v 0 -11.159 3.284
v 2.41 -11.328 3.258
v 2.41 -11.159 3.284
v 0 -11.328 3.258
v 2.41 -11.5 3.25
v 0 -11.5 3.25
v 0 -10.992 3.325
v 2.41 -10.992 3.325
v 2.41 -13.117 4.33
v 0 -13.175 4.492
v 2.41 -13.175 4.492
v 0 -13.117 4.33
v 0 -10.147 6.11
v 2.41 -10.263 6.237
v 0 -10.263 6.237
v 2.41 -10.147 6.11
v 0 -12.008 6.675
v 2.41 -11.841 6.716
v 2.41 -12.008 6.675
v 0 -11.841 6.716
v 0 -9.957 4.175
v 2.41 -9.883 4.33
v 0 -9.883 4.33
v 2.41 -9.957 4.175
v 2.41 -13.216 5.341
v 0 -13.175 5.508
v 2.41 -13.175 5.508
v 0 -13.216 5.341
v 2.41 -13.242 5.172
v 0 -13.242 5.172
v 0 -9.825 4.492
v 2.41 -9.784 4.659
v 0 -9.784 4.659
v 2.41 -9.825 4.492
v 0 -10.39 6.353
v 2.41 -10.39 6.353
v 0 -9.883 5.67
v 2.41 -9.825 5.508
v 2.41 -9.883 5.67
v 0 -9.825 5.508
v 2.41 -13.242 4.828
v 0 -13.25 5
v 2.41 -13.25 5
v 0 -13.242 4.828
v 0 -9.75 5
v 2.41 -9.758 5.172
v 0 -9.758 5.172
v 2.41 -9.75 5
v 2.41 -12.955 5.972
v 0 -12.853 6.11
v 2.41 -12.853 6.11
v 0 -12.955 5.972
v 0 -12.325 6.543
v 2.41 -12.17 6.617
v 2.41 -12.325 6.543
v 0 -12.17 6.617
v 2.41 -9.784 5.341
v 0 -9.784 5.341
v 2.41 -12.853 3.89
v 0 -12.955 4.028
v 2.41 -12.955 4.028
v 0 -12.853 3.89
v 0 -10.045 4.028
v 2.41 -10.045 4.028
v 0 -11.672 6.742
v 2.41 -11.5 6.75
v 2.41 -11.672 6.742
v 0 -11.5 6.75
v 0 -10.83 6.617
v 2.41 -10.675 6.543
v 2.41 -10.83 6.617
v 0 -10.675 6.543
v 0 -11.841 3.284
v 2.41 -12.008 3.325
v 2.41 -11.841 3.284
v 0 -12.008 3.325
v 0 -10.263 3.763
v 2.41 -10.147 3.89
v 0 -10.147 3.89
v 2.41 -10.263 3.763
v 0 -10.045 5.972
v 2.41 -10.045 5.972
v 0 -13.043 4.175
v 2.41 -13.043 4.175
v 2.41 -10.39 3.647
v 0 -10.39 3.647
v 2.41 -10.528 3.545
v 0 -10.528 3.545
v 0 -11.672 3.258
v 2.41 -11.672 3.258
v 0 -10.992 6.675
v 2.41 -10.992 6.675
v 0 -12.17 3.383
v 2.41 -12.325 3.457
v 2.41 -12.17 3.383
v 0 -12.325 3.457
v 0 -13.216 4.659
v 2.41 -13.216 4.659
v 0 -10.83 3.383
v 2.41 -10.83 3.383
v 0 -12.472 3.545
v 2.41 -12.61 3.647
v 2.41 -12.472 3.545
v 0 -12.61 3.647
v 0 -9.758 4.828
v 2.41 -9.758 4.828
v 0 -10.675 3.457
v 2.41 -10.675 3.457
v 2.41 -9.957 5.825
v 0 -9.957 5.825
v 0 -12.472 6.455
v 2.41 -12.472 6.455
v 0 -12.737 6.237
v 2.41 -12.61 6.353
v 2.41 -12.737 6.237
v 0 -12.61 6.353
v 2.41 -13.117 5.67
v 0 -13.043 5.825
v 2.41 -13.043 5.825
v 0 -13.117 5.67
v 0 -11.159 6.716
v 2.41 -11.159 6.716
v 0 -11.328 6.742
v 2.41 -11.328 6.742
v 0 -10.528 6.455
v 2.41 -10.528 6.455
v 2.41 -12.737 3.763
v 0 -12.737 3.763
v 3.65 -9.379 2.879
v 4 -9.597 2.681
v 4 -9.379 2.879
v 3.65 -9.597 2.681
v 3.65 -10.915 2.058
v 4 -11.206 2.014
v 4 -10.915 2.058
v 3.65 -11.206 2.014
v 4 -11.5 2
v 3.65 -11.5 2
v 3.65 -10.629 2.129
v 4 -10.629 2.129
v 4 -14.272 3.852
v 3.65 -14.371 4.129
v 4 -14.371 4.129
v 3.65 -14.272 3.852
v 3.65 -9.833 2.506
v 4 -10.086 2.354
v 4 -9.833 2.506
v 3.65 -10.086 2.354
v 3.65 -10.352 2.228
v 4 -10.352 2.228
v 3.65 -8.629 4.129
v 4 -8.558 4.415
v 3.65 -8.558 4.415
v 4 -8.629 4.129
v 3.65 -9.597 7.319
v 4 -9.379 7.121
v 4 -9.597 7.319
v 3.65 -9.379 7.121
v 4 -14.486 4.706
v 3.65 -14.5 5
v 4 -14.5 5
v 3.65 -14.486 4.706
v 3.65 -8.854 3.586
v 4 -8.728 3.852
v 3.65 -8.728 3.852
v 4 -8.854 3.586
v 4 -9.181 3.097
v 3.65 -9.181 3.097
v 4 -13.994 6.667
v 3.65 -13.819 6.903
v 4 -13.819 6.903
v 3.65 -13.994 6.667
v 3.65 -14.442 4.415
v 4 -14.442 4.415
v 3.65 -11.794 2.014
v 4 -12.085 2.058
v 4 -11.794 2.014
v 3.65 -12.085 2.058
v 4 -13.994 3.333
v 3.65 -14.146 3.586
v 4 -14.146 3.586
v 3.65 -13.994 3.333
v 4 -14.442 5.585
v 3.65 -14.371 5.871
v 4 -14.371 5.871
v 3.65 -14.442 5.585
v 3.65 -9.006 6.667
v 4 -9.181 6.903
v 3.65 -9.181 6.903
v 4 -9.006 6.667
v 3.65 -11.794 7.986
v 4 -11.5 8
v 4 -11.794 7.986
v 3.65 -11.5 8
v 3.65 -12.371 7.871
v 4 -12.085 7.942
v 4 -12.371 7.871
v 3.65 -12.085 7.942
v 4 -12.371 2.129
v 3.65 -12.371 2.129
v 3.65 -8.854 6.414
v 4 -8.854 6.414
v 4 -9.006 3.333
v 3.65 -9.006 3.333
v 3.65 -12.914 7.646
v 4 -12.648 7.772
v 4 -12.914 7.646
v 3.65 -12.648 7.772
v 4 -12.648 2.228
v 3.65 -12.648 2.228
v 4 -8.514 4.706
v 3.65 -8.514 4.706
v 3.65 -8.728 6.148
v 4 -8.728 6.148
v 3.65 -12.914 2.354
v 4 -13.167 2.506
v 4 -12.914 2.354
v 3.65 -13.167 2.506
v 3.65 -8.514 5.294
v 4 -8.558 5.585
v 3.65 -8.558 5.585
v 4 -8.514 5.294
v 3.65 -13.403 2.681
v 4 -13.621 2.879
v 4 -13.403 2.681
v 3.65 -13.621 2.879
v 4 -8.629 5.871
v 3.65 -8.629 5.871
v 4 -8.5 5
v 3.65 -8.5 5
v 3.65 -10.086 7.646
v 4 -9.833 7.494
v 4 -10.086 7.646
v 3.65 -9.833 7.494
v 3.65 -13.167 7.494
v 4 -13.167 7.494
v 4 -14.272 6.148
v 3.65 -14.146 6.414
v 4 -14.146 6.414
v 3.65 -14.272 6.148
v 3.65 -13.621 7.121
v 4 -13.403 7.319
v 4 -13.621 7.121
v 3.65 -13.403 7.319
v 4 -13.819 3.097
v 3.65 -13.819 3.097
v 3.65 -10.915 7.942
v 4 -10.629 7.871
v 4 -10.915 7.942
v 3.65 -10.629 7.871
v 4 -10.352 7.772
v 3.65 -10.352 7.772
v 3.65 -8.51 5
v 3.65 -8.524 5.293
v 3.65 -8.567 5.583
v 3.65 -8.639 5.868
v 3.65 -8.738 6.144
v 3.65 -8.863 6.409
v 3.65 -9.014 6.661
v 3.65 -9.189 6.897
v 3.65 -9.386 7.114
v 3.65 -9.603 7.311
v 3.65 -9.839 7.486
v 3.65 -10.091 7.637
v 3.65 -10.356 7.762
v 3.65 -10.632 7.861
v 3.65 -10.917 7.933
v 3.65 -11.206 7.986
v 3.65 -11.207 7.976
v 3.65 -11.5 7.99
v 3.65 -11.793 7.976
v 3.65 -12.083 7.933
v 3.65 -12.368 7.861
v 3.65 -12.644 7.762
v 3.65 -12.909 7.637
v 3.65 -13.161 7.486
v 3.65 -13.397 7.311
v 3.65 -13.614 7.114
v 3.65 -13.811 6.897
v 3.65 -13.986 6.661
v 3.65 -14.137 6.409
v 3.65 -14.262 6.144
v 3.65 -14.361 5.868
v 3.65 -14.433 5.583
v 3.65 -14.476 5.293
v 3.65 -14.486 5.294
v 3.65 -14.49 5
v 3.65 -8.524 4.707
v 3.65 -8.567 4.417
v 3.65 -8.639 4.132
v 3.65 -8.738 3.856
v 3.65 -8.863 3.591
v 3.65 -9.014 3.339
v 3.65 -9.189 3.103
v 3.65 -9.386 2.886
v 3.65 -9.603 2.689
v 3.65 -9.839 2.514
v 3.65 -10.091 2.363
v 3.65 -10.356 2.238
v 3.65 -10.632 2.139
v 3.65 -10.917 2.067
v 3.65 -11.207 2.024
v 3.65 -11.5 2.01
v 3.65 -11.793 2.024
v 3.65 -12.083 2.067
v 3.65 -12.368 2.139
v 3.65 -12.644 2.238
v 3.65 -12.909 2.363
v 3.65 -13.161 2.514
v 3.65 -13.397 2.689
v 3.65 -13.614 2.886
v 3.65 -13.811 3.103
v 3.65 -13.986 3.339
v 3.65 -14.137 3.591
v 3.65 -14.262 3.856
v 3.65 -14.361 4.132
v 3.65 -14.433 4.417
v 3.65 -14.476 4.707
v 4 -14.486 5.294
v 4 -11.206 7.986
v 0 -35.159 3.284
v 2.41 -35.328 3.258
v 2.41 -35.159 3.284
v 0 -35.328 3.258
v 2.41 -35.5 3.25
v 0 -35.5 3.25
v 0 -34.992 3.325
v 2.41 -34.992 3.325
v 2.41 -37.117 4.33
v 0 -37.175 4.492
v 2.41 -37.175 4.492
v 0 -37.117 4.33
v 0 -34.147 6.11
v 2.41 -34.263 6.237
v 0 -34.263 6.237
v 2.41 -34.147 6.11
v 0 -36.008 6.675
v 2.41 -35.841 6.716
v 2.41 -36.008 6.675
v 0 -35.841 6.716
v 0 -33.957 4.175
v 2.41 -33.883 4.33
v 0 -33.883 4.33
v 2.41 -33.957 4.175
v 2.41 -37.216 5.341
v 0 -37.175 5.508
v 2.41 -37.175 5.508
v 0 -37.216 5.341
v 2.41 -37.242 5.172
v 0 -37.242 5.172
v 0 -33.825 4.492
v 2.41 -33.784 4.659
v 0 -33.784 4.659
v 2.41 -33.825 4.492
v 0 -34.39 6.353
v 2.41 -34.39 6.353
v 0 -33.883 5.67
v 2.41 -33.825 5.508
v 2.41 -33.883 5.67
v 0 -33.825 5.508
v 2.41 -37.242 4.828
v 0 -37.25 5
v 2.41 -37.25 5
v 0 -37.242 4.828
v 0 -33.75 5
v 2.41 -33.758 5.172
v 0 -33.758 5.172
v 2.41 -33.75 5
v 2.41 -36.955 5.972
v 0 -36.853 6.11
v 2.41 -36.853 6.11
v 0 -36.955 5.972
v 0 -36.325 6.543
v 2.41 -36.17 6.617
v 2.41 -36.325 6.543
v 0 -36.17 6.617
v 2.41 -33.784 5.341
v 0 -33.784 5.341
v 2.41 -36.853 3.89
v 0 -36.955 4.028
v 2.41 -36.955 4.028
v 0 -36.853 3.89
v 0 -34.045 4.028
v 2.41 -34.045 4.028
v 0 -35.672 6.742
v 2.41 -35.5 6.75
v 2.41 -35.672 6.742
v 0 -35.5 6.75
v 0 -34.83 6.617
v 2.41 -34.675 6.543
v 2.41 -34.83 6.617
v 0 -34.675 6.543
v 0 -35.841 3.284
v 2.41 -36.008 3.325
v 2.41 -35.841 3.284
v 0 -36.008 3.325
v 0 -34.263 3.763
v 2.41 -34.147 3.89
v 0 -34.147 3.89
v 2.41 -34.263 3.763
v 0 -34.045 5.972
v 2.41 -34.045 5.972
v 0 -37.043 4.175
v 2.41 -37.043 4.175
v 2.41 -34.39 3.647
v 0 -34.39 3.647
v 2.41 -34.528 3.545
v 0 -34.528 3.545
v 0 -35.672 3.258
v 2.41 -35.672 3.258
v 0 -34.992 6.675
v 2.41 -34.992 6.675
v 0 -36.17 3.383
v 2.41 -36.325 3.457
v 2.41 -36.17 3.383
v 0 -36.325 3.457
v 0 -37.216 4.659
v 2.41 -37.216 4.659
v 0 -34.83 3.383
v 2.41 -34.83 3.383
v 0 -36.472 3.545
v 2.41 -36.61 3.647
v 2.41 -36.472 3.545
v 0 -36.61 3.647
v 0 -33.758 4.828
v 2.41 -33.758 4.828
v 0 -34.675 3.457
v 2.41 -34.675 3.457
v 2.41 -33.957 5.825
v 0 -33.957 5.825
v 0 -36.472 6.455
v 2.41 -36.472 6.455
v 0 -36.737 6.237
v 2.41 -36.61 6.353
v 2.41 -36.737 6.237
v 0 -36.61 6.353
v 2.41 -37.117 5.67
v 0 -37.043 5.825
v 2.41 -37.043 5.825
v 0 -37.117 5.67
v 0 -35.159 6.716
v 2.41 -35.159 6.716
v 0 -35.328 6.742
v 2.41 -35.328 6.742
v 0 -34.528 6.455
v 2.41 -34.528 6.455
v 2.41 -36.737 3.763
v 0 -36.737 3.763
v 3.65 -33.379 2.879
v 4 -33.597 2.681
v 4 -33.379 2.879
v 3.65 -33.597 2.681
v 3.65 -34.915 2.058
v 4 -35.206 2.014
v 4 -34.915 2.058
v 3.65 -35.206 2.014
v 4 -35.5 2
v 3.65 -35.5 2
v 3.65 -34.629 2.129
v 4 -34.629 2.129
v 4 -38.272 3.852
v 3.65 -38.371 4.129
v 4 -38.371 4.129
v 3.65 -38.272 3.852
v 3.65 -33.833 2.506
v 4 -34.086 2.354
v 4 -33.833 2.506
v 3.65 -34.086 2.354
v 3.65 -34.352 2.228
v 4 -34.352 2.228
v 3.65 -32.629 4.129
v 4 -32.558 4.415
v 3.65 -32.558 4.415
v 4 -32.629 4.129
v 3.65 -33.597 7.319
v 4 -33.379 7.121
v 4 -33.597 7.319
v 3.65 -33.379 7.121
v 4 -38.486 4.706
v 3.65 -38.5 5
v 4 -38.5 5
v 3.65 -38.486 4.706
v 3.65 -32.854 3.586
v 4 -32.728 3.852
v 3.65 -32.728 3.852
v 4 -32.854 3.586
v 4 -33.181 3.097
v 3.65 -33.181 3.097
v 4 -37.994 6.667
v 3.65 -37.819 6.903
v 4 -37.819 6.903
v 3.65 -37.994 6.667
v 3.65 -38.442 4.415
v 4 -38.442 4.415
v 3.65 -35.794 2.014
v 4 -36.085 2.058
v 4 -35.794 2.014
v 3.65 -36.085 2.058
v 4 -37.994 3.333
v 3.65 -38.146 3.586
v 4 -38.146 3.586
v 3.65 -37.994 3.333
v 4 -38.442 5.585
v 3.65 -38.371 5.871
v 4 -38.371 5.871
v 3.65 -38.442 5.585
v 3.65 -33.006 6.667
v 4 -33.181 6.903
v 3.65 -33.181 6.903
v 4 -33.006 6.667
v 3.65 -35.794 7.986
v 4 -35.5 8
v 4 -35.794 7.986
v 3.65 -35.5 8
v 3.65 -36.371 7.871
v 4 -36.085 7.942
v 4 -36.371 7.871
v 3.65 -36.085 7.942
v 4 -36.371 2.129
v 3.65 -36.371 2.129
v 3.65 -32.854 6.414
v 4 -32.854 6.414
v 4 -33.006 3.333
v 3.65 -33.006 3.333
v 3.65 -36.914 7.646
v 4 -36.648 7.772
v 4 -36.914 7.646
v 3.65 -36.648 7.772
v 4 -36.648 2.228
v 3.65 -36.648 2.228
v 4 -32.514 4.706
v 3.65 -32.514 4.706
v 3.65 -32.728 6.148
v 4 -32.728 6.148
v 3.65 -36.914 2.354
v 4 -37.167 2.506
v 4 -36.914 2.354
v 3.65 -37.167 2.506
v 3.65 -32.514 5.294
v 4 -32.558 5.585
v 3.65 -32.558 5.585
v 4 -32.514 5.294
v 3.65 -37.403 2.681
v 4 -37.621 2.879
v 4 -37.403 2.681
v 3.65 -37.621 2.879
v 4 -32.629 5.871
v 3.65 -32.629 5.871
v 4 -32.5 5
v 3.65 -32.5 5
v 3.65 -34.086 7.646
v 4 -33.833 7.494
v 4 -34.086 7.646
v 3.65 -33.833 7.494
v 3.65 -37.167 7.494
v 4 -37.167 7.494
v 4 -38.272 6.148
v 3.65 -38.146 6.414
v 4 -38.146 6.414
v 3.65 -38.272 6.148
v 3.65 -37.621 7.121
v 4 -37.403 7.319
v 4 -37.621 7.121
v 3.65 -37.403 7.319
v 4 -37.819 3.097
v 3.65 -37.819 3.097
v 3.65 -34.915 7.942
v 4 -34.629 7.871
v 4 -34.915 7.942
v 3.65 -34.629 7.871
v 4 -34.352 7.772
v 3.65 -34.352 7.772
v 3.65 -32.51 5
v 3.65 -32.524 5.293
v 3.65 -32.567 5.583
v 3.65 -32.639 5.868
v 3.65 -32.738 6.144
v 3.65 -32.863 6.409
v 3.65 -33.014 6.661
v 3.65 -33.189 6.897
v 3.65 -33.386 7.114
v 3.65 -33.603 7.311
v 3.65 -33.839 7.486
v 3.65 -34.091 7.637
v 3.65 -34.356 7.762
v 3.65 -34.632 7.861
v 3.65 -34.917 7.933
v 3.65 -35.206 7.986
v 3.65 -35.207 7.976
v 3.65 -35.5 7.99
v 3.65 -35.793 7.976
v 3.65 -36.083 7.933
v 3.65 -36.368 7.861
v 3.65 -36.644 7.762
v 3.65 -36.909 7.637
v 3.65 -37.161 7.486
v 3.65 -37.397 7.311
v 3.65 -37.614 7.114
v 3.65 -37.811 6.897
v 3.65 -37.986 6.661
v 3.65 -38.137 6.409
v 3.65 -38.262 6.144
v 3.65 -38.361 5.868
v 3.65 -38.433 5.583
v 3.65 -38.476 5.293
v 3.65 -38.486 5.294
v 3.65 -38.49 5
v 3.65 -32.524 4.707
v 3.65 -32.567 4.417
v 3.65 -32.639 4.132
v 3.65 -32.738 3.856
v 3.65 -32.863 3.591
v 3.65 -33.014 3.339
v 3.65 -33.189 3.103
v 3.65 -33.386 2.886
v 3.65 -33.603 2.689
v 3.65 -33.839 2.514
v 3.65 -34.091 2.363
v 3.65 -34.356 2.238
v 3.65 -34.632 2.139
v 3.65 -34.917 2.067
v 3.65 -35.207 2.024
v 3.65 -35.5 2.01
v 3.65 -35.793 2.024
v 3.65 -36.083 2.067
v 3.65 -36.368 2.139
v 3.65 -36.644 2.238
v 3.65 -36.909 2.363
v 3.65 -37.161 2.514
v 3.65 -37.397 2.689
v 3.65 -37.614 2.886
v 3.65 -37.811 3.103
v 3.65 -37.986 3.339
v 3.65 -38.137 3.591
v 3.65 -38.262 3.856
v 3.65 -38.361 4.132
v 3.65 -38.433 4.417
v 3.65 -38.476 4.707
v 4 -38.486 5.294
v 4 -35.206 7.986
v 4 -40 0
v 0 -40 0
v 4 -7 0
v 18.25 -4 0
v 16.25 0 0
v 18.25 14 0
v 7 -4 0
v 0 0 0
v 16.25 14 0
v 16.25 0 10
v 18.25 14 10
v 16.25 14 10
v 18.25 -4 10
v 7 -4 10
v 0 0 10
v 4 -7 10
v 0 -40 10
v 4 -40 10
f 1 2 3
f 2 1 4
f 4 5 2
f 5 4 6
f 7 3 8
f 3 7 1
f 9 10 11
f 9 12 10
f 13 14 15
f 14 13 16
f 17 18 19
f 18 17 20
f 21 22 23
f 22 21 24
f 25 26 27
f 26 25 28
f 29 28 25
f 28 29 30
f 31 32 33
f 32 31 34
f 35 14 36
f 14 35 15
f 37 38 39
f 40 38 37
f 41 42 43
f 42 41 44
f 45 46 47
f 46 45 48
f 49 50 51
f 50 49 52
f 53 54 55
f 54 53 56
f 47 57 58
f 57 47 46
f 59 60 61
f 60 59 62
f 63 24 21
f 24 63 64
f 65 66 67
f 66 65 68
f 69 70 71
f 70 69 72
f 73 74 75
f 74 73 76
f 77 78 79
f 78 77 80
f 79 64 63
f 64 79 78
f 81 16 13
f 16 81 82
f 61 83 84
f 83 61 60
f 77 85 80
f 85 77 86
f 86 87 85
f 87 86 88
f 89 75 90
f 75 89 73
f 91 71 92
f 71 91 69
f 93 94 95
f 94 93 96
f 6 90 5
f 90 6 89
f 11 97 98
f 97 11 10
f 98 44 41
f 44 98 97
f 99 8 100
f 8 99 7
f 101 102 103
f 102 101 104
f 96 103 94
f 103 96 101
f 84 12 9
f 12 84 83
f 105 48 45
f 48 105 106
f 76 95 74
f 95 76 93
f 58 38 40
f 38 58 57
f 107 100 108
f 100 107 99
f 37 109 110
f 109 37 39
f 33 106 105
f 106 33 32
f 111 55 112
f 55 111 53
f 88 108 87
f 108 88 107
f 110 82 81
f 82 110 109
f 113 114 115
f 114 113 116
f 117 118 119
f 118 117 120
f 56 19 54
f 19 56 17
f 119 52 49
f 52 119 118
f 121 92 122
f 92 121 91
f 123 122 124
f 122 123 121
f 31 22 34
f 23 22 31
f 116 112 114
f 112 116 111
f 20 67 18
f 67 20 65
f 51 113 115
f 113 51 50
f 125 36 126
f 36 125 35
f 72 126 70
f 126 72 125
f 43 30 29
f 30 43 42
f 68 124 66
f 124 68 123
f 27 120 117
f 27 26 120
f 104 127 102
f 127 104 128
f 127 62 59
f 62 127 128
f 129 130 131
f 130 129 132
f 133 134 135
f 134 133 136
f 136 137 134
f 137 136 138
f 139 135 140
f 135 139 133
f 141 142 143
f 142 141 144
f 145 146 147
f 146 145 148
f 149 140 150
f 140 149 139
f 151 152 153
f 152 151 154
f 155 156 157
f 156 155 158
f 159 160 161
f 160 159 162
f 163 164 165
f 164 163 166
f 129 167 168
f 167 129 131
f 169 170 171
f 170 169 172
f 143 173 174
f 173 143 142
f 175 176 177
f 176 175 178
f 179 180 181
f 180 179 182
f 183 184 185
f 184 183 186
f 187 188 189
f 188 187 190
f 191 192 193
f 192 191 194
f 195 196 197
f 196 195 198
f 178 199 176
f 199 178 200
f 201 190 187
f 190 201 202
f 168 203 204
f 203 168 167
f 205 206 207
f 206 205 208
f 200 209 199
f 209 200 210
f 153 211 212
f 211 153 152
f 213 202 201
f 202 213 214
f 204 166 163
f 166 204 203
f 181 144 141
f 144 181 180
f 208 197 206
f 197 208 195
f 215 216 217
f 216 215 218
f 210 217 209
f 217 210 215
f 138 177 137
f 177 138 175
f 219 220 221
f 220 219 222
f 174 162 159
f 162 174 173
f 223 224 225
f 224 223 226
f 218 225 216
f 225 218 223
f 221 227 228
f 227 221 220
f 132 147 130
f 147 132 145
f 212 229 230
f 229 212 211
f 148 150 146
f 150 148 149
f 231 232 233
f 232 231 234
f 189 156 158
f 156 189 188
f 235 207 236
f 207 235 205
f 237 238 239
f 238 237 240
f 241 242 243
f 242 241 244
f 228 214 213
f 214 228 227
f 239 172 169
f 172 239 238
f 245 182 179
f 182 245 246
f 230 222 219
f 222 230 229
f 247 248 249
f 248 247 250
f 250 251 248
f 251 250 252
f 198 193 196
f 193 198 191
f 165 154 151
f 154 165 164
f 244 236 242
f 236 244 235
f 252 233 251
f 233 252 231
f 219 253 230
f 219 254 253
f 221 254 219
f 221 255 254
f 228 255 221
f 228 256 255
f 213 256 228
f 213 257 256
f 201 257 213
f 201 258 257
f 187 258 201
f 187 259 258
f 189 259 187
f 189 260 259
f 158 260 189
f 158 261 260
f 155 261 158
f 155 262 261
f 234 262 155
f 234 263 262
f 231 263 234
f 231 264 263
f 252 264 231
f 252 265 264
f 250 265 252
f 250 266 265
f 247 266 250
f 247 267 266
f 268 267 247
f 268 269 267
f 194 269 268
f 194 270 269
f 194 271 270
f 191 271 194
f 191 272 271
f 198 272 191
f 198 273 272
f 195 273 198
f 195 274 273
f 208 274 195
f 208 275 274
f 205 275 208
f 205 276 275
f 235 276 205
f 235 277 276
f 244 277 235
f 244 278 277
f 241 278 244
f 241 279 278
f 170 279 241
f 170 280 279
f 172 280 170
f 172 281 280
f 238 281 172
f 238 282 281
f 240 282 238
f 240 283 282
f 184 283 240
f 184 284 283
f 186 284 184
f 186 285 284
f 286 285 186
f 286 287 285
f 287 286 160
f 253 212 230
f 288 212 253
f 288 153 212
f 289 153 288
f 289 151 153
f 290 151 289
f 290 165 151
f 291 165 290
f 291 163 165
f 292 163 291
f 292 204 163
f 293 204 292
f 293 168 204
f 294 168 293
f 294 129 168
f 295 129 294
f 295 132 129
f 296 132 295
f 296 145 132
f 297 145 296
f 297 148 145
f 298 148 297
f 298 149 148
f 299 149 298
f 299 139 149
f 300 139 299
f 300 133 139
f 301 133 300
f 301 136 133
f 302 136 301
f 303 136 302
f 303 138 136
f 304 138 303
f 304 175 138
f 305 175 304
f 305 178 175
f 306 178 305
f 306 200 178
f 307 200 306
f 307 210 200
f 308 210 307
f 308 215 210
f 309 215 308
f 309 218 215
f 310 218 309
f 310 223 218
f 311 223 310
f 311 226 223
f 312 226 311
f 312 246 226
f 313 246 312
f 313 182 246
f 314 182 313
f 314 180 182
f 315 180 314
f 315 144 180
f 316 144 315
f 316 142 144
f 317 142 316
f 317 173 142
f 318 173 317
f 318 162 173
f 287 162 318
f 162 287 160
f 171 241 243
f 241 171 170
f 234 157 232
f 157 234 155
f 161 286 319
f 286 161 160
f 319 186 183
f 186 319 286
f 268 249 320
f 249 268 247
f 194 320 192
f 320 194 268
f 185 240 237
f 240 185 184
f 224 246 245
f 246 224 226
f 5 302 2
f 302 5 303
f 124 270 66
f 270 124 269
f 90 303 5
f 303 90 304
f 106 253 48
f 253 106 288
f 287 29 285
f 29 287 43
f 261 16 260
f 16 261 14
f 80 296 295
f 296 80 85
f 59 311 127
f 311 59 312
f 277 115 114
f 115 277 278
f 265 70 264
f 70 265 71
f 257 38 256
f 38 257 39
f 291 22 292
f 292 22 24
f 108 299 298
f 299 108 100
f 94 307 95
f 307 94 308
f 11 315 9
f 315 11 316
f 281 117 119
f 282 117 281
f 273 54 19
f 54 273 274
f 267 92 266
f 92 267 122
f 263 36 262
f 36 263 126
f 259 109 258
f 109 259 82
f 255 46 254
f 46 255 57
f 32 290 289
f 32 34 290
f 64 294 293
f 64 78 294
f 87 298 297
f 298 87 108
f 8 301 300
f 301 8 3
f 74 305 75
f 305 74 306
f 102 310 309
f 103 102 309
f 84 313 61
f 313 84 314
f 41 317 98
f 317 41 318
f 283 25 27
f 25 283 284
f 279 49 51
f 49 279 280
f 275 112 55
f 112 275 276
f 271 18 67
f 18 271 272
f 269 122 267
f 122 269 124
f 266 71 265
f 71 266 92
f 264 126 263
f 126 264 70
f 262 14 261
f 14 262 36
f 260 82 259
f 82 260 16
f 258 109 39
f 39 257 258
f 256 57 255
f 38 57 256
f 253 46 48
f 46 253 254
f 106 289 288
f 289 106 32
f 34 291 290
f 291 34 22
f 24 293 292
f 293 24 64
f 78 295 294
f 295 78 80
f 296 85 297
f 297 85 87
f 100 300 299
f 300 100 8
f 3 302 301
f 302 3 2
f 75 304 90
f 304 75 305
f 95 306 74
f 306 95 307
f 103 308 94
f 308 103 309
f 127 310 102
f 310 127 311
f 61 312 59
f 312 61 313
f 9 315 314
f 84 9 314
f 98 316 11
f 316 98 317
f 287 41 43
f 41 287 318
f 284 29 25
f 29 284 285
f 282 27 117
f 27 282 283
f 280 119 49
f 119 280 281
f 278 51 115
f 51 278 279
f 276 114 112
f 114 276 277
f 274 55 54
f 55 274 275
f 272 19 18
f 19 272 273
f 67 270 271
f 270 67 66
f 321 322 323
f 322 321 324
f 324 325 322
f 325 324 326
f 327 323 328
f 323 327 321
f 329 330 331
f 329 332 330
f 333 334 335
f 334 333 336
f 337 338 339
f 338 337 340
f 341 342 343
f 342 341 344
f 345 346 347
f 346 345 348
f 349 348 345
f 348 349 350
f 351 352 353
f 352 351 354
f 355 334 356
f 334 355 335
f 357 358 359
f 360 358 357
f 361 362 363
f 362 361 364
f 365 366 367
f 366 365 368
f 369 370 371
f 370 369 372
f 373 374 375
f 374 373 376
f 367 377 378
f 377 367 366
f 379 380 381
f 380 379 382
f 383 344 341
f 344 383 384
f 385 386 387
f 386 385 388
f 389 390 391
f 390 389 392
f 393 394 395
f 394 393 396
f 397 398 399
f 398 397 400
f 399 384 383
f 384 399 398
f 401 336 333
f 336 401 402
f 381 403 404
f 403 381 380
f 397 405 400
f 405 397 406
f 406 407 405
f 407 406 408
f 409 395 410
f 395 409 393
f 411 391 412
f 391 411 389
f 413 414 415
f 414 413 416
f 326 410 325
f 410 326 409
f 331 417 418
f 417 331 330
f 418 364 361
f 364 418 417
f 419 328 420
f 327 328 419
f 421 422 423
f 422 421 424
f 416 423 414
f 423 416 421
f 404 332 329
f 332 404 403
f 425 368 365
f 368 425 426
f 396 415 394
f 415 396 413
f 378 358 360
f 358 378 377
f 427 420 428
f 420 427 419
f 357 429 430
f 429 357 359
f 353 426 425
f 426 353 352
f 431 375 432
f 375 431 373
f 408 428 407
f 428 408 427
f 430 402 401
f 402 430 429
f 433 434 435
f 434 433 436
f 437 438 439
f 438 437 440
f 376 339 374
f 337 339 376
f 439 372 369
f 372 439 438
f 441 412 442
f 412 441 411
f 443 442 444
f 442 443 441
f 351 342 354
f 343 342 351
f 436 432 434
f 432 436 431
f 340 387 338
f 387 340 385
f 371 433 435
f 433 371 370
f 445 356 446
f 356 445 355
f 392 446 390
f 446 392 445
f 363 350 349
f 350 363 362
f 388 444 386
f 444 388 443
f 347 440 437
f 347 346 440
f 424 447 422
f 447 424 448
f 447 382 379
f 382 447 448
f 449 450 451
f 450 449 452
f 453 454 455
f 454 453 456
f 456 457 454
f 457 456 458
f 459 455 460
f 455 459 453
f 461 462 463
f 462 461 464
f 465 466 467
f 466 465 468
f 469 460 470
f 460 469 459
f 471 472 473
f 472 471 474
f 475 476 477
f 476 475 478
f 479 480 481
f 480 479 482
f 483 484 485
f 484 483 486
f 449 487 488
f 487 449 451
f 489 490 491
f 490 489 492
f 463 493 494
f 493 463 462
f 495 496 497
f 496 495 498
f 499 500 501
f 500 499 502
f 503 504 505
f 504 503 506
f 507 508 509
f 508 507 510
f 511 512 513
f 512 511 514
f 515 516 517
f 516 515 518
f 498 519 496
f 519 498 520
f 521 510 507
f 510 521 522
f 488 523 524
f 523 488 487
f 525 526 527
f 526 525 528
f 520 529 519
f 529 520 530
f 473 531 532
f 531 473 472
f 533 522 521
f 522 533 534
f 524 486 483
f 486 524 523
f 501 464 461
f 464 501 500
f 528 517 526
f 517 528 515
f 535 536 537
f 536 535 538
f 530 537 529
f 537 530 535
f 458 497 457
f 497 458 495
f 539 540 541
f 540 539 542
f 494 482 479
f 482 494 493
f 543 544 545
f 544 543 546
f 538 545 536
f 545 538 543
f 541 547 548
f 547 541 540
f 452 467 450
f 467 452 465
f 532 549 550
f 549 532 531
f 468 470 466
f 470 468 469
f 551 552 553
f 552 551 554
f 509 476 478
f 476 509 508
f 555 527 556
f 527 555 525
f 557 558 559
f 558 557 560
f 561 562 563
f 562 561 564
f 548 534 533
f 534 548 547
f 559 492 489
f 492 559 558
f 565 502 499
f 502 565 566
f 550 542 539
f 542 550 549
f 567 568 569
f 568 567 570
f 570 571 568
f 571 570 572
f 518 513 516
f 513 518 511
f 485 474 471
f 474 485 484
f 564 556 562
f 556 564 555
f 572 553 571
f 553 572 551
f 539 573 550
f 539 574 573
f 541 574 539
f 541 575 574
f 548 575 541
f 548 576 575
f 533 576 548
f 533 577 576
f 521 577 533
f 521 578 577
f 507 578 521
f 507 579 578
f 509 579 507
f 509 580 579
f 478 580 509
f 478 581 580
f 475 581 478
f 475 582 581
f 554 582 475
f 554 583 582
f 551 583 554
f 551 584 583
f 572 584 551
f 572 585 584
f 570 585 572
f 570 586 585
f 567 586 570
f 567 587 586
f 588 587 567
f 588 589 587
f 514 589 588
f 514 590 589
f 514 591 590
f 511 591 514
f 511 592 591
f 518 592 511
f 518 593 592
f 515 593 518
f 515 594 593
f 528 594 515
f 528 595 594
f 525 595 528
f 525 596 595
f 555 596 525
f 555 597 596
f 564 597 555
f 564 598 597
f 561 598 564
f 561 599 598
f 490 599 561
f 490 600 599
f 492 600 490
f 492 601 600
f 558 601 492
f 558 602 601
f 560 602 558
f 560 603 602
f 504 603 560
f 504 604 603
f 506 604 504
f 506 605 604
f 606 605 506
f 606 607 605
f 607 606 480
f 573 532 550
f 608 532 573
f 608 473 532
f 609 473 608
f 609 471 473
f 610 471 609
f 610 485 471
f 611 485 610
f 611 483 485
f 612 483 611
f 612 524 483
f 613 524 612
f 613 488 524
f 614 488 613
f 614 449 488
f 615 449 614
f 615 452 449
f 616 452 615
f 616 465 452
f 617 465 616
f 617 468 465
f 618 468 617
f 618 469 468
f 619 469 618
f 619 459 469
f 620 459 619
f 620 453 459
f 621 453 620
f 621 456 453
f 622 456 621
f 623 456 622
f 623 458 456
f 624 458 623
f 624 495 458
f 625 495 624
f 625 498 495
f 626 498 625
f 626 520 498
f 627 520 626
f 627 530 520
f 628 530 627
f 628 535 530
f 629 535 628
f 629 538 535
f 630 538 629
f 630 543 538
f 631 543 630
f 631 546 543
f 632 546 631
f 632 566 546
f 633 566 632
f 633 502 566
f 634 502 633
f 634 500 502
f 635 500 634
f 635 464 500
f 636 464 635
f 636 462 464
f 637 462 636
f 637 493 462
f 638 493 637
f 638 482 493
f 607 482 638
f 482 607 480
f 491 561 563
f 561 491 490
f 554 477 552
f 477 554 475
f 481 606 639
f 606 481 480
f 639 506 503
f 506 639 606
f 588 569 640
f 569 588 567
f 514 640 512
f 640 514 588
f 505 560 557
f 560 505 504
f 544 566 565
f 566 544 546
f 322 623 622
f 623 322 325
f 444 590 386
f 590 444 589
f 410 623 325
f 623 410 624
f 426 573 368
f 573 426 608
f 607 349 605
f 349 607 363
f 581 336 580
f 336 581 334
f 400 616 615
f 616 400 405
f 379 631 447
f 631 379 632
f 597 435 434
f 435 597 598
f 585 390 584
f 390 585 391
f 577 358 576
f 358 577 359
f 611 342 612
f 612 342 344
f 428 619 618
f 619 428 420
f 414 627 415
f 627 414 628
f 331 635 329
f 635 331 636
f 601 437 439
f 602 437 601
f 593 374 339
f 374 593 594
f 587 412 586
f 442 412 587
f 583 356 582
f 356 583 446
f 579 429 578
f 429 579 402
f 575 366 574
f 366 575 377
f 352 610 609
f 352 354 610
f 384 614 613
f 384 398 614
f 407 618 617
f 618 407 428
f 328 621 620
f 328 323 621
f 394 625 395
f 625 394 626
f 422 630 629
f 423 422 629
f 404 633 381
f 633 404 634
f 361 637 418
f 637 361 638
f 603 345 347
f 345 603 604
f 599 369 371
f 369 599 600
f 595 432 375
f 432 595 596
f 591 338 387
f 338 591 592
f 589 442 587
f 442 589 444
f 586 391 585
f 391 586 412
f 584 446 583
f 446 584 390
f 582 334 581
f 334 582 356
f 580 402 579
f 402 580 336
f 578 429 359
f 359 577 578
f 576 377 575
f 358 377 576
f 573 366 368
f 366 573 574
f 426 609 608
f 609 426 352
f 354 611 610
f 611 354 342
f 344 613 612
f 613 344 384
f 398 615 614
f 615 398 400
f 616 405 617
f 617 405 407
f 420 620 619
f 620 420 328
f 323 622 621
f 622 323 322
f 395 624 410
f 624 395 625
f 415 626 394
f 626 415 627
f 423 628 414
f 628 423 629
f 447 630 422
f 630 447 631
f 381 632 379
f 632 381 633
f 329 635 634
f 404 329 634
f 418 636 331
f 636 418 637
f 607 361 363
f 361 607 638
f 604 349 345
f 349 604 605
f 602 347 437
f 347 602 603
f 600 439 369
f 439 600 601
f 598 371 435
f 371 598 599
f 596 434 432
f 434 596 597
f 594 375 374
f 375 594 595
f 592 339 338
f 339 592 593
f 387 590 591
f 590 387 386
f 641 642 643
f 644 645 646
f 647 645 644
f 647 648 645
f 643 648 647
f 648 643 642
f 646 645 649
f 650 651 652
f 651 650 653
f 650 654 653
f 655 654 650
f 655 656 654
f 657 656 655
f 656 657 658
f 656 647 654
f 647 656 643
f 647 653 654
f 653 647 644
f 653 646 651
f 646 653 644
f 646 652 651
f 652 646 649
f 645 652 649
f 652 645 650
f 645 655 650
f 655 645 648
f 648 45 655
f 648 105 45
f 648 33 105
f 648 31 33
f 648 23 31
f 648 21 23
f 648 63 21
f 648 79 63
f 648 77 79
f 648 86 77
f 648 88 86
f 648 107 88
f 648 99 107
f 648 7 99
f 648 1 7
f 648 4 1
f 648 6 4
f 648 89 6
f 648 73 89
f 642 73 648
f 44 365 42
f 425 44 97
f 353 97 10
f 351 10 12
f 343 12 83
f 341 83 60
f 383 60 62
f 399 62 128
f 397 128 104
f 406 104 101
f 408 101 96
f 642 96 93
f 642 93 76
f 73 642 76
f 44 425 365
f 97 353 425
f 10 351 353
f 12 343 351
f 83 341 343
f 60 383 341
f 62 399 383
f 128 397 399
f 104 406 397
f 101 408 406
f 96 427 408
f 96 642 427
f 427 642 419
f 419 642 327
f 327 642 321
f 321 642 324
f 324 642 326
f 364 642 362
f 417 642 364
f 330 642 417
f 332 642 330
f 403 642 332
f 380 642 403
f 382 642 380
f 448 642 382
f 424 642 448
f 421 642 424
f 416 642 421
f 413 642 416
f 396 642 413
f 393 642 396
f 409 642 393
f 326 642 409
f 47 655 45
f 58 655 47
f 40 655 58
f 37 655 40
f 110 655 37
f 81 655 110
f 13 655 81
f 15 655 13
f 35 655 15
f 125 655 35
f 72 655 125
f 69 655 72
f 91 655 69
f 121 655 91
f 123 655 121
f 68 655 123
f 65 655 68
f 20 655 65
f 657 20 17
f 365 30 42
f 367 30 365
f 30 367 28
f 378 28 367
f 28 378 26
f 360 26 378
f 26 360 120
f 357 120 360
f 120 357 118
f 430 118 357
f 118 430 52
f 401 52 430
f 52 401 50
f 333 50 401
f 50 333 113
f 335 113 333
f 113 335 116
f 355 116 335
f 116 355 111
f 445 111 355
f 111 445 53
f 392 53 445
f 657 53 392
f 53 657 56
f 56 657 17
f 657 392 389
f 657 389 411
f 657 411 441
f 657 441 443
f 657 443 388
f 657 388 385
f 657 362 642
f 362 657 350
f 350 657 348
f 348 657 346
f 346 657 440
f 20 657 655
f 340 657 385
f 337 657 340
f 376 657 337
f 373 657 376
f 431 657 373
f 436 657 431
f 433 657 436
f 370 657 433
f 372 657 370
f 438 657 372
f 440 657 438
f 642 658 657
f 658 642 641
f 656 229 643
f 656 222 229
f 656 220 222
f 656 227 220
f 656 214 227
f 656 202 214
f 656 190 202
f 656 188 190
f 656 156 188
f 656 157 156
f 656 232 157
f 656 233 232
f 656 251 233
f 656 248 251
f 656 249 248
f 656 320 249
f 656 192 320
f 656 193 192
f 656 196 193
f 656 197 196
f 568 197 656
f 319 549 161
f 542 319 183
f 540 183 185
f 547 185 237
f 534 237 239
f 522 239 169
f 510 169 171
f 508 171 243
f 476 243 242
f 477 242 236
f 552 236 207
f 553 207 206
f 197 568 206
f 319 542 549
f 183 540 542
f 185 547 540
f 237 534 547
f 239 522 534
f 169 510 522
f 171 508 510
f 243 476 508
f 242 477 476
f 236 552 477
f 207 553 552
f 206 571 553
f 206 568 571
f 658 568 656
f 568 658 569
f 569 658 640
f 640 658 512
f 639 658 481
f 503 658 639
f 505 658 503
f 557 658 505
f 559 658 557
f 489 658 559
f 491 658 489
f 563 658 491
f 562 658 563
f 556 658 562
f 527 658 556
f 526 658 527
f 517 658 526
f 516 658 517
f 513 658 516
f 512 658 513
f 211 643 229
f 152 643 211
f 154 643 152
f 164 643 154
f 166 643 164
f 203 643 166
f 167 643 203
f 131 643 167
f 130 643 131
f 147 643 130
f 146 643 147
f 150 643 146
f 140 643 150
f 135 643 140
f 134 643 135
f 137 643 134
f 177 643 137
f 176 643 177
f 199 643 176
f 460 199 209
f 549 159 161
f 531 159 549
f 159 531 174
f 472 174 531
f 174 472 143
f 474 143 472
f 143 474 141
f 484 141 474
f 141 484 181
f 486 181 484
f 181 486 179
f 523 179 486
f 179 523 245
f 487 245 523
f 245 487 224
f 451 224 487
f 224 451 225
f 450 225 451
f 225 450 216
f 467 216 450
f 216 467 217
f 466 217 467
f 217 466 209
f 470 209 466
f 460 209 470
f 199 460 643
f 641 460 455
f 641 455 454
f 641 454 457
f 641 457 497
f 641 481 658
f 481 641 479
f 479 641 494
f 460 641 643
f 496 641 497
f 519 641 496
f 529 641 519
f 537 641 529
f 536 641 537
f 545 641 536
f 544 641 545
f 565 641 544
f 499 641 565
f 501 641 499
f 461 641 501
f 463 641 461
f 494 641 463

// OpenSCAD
// Printed insect-screen hook: an original CanFactory design, published under CC BY 4.0.
//
// A hook that hangs a screen frame (the window catio's insert) on a tilt-and-turn window's fixed frame, without drilling: its leg
// is screwed to the back of the frame's stile, where the stile lies over the window opening; a turn runs into the window just
// inside the fixed frame's outer lip; and a barb reaches behind the lip, in the seal gap in front of the closed sash, so the sash
// still closes over it. It is generated for one window: the barb stands where the lip's thickness (FRAME_LIP) and the seal gap
// (SEAL_GAP) put it, centred in the gap, so nothing is bent on site.
//
// Two parts: the long hook for the head (its barb up behind the head lip) and the short one for the sill (barb down behind the
// sill lip, the same hook turned over). The short barb rises ENGAGE + CLEARANCE past the turn: it reaches ENGAGE behind the sill
// lip with its turn CLEARANCE off the lip's tip. To hang the frame it is lifted that much, so the long hooks' turns stand that
// and CLEARANCE more below the head lip's tip, and their barbs rise ENGAGE past the tip from there:
// 2 x (ENGAGE + CLEARANCE) past the turn (packages/contracts/src/printedScreenHook.ts, printedScreenHookShape).
//
// Section, in X and Y, extruded WIDTH along Z: X from the leg's face on the stile (x = 0) into the window; Y along the stile from
// the turn's outer face (y = 0, towards the lip's tip) away from the leg: the leg runs to y = -LEG_LENGTH, the barb rises to +y.
// It prints as generated, lying on its side (z = 0) with the section on the bed, so the layers run along the barb and the turn
// and no supports are needed. The leg's two holes run across it (along X), countersunk on its inner face (x = LEG_THICKNESS):
// the screws go in from the room side into the stile. A fillet (gusset) stiffens the leg's corner with the turn.

// Which hook: the long one (head) or the short one (sill)
PART = "long"; //[long,short]

// The window: the fixed frame's lip, from its outer face to its back (where its seal is), and the gap from there to the closed sash
FRAME_LIP = 15.5; //[5:0.5:35]
SEAL_GAP = 3.5;   //[1:0.5:10]
// How far both barbs reach behind the lip once hung, and how far the short hooks' turns stand off the sill lip's tip
ENGAGE = 6;       //[3:0.5:15]
CLEARANCE = 1;    //[0.5:0.5:3]

WIDTH = 10;          //[8:0.5:20]
LEG_LENGTH = 40;     //[25:1:80]
LEG_THICKNESS = 4;   //[2.5:0.5:8]
TURN_THICKNESS = 4;  //[2.5:0.5:8]
BARB_THICKNESS = 2;  //[1.2:0.1:4]

// The wood screw (DIN 7997, from the parts library; see packages/contracts/src/models.ts, printedScreenHook): its clearance holes
// (fine, medium, coarse: d + 0.3 / 0.5 / 0.8 mm), diameter and head.
HOLE_FIT = "medium"; //[fine,medium,coarse]
WOOD_HOLES = [3.3,3.5,3.8];
WOOD_D = 3;
WOOD_DK = 5.6;
WOOD_K = 1.65;
SINK_PLAY = 0.4;

ROUNDNESS = 64; //[32:8:192]

// Fixed sizes, mirrored in printedScreenHook.ts: the largest fillet, the material round a countersink, the barb's least gap
GUSSET_MAX = 3;
SINK_WALL = 1.5;
GAP = 0.5;

FIT      = HOLE_FIT == "fine" ? 0 : HOLE_FIT == "coarse" ? 2 : 1;
HOLE_D   = WOOD_HOLES[FIT];
SINK_D   = WOOD_DK + SINK_PLAY;
SINK_RIM = max(0, WOOD_K - (WOOD_DK - WOOD_D) / 2);

FRONT  = FRAME_LIP + (SEAL_GAP - BARB_THICKNESS) / 2;
BACK   = FRONT + BARB_THICKNESS;
SHORT_RISE = ENGAGE + CLEARANCE;
RISE   = PART == "long" ? ENGAGE + SHORT_RISE + CLEARANCE : SHORT_RISE;
GUSSET = max(0, min(GUSSET_MAX, FRONT - LEG_THICKNESS - 0.5));
SINK   = SINK_D / 2 + SINK_WALL;
HOLES  = [-(TURN_THICKNESS + GUSSET + SINK), -(LEG_LENGTH - SINK)];

assert(BARB_THICKNESS + 2 * GAP <= SEAL_GAP + 1e-6, "the barb must leave GAP each side in the seal gap");
assert(FRONT - LEG_THICKNESS >= 1 - 1e-6, "the turn must reach on from the leg to the barb");
assert(LEG_THICKNESS >= WOOD_K + 1 - 1e-6, "LEG_THICKNESS must leave 1 mm of hole under the screw's countersunk head");
assert(WIDTH >= SINK_D + 2 * SINK_WALL - 1e-6, "WIDTH must leave SINK_WALL round the countersinks");
assert(HOLES[0] - HOLES[1] >= 2 * SINK - 1e-6, "the leg must be long enough for two screws");

module section() {
    polygon([
        [0, -LEG_LENGTH], [LEG_THICKNESS, -LEG_LENGTH], [LEG_THICKNESS, -TURN_THICKNESS - GUSSET],
        [LEG_THICKNESS + GUSSET, -TURN_THICKNESS], [BACK, -TURN_THICKNESS], [BACK, RISE], [FRONT, RISE], [FRONT, 0], [0, 0],
    ]);
}

module screw_hole() {
    rotate([0, 90, 0]) {
        translate([0, 0, -1]) cylinder(d = HOLE_D, h = LEG_THICKNESS + 2, $fn = ROUNDNESS);
        // the head's rim, then a 90 degree cone from SINK_D down to the hole; the rim overshoots the inner face by 0.5 mm
        translate([0, 0, LEG_THICKNESS - SINK_RIM]) cylinder(d = SINK_D, h = SINK_RIM + 0.5, $fn = ROUNDNESS);
        translate([0, 0, LEG_THICKNESS - SINK_RIM - SINK_D / 2 + 0.01]) cylinder(d1 = 0, d2 = SINK_D, h = SINK_D / 2, $fn = ROUNDNESS);
    }
}

difference() {
    linear_extrude(WIDTH) section();
    for (y = HOLES) translate([0, y, WIDTH / 2]) screw_hole();
}
